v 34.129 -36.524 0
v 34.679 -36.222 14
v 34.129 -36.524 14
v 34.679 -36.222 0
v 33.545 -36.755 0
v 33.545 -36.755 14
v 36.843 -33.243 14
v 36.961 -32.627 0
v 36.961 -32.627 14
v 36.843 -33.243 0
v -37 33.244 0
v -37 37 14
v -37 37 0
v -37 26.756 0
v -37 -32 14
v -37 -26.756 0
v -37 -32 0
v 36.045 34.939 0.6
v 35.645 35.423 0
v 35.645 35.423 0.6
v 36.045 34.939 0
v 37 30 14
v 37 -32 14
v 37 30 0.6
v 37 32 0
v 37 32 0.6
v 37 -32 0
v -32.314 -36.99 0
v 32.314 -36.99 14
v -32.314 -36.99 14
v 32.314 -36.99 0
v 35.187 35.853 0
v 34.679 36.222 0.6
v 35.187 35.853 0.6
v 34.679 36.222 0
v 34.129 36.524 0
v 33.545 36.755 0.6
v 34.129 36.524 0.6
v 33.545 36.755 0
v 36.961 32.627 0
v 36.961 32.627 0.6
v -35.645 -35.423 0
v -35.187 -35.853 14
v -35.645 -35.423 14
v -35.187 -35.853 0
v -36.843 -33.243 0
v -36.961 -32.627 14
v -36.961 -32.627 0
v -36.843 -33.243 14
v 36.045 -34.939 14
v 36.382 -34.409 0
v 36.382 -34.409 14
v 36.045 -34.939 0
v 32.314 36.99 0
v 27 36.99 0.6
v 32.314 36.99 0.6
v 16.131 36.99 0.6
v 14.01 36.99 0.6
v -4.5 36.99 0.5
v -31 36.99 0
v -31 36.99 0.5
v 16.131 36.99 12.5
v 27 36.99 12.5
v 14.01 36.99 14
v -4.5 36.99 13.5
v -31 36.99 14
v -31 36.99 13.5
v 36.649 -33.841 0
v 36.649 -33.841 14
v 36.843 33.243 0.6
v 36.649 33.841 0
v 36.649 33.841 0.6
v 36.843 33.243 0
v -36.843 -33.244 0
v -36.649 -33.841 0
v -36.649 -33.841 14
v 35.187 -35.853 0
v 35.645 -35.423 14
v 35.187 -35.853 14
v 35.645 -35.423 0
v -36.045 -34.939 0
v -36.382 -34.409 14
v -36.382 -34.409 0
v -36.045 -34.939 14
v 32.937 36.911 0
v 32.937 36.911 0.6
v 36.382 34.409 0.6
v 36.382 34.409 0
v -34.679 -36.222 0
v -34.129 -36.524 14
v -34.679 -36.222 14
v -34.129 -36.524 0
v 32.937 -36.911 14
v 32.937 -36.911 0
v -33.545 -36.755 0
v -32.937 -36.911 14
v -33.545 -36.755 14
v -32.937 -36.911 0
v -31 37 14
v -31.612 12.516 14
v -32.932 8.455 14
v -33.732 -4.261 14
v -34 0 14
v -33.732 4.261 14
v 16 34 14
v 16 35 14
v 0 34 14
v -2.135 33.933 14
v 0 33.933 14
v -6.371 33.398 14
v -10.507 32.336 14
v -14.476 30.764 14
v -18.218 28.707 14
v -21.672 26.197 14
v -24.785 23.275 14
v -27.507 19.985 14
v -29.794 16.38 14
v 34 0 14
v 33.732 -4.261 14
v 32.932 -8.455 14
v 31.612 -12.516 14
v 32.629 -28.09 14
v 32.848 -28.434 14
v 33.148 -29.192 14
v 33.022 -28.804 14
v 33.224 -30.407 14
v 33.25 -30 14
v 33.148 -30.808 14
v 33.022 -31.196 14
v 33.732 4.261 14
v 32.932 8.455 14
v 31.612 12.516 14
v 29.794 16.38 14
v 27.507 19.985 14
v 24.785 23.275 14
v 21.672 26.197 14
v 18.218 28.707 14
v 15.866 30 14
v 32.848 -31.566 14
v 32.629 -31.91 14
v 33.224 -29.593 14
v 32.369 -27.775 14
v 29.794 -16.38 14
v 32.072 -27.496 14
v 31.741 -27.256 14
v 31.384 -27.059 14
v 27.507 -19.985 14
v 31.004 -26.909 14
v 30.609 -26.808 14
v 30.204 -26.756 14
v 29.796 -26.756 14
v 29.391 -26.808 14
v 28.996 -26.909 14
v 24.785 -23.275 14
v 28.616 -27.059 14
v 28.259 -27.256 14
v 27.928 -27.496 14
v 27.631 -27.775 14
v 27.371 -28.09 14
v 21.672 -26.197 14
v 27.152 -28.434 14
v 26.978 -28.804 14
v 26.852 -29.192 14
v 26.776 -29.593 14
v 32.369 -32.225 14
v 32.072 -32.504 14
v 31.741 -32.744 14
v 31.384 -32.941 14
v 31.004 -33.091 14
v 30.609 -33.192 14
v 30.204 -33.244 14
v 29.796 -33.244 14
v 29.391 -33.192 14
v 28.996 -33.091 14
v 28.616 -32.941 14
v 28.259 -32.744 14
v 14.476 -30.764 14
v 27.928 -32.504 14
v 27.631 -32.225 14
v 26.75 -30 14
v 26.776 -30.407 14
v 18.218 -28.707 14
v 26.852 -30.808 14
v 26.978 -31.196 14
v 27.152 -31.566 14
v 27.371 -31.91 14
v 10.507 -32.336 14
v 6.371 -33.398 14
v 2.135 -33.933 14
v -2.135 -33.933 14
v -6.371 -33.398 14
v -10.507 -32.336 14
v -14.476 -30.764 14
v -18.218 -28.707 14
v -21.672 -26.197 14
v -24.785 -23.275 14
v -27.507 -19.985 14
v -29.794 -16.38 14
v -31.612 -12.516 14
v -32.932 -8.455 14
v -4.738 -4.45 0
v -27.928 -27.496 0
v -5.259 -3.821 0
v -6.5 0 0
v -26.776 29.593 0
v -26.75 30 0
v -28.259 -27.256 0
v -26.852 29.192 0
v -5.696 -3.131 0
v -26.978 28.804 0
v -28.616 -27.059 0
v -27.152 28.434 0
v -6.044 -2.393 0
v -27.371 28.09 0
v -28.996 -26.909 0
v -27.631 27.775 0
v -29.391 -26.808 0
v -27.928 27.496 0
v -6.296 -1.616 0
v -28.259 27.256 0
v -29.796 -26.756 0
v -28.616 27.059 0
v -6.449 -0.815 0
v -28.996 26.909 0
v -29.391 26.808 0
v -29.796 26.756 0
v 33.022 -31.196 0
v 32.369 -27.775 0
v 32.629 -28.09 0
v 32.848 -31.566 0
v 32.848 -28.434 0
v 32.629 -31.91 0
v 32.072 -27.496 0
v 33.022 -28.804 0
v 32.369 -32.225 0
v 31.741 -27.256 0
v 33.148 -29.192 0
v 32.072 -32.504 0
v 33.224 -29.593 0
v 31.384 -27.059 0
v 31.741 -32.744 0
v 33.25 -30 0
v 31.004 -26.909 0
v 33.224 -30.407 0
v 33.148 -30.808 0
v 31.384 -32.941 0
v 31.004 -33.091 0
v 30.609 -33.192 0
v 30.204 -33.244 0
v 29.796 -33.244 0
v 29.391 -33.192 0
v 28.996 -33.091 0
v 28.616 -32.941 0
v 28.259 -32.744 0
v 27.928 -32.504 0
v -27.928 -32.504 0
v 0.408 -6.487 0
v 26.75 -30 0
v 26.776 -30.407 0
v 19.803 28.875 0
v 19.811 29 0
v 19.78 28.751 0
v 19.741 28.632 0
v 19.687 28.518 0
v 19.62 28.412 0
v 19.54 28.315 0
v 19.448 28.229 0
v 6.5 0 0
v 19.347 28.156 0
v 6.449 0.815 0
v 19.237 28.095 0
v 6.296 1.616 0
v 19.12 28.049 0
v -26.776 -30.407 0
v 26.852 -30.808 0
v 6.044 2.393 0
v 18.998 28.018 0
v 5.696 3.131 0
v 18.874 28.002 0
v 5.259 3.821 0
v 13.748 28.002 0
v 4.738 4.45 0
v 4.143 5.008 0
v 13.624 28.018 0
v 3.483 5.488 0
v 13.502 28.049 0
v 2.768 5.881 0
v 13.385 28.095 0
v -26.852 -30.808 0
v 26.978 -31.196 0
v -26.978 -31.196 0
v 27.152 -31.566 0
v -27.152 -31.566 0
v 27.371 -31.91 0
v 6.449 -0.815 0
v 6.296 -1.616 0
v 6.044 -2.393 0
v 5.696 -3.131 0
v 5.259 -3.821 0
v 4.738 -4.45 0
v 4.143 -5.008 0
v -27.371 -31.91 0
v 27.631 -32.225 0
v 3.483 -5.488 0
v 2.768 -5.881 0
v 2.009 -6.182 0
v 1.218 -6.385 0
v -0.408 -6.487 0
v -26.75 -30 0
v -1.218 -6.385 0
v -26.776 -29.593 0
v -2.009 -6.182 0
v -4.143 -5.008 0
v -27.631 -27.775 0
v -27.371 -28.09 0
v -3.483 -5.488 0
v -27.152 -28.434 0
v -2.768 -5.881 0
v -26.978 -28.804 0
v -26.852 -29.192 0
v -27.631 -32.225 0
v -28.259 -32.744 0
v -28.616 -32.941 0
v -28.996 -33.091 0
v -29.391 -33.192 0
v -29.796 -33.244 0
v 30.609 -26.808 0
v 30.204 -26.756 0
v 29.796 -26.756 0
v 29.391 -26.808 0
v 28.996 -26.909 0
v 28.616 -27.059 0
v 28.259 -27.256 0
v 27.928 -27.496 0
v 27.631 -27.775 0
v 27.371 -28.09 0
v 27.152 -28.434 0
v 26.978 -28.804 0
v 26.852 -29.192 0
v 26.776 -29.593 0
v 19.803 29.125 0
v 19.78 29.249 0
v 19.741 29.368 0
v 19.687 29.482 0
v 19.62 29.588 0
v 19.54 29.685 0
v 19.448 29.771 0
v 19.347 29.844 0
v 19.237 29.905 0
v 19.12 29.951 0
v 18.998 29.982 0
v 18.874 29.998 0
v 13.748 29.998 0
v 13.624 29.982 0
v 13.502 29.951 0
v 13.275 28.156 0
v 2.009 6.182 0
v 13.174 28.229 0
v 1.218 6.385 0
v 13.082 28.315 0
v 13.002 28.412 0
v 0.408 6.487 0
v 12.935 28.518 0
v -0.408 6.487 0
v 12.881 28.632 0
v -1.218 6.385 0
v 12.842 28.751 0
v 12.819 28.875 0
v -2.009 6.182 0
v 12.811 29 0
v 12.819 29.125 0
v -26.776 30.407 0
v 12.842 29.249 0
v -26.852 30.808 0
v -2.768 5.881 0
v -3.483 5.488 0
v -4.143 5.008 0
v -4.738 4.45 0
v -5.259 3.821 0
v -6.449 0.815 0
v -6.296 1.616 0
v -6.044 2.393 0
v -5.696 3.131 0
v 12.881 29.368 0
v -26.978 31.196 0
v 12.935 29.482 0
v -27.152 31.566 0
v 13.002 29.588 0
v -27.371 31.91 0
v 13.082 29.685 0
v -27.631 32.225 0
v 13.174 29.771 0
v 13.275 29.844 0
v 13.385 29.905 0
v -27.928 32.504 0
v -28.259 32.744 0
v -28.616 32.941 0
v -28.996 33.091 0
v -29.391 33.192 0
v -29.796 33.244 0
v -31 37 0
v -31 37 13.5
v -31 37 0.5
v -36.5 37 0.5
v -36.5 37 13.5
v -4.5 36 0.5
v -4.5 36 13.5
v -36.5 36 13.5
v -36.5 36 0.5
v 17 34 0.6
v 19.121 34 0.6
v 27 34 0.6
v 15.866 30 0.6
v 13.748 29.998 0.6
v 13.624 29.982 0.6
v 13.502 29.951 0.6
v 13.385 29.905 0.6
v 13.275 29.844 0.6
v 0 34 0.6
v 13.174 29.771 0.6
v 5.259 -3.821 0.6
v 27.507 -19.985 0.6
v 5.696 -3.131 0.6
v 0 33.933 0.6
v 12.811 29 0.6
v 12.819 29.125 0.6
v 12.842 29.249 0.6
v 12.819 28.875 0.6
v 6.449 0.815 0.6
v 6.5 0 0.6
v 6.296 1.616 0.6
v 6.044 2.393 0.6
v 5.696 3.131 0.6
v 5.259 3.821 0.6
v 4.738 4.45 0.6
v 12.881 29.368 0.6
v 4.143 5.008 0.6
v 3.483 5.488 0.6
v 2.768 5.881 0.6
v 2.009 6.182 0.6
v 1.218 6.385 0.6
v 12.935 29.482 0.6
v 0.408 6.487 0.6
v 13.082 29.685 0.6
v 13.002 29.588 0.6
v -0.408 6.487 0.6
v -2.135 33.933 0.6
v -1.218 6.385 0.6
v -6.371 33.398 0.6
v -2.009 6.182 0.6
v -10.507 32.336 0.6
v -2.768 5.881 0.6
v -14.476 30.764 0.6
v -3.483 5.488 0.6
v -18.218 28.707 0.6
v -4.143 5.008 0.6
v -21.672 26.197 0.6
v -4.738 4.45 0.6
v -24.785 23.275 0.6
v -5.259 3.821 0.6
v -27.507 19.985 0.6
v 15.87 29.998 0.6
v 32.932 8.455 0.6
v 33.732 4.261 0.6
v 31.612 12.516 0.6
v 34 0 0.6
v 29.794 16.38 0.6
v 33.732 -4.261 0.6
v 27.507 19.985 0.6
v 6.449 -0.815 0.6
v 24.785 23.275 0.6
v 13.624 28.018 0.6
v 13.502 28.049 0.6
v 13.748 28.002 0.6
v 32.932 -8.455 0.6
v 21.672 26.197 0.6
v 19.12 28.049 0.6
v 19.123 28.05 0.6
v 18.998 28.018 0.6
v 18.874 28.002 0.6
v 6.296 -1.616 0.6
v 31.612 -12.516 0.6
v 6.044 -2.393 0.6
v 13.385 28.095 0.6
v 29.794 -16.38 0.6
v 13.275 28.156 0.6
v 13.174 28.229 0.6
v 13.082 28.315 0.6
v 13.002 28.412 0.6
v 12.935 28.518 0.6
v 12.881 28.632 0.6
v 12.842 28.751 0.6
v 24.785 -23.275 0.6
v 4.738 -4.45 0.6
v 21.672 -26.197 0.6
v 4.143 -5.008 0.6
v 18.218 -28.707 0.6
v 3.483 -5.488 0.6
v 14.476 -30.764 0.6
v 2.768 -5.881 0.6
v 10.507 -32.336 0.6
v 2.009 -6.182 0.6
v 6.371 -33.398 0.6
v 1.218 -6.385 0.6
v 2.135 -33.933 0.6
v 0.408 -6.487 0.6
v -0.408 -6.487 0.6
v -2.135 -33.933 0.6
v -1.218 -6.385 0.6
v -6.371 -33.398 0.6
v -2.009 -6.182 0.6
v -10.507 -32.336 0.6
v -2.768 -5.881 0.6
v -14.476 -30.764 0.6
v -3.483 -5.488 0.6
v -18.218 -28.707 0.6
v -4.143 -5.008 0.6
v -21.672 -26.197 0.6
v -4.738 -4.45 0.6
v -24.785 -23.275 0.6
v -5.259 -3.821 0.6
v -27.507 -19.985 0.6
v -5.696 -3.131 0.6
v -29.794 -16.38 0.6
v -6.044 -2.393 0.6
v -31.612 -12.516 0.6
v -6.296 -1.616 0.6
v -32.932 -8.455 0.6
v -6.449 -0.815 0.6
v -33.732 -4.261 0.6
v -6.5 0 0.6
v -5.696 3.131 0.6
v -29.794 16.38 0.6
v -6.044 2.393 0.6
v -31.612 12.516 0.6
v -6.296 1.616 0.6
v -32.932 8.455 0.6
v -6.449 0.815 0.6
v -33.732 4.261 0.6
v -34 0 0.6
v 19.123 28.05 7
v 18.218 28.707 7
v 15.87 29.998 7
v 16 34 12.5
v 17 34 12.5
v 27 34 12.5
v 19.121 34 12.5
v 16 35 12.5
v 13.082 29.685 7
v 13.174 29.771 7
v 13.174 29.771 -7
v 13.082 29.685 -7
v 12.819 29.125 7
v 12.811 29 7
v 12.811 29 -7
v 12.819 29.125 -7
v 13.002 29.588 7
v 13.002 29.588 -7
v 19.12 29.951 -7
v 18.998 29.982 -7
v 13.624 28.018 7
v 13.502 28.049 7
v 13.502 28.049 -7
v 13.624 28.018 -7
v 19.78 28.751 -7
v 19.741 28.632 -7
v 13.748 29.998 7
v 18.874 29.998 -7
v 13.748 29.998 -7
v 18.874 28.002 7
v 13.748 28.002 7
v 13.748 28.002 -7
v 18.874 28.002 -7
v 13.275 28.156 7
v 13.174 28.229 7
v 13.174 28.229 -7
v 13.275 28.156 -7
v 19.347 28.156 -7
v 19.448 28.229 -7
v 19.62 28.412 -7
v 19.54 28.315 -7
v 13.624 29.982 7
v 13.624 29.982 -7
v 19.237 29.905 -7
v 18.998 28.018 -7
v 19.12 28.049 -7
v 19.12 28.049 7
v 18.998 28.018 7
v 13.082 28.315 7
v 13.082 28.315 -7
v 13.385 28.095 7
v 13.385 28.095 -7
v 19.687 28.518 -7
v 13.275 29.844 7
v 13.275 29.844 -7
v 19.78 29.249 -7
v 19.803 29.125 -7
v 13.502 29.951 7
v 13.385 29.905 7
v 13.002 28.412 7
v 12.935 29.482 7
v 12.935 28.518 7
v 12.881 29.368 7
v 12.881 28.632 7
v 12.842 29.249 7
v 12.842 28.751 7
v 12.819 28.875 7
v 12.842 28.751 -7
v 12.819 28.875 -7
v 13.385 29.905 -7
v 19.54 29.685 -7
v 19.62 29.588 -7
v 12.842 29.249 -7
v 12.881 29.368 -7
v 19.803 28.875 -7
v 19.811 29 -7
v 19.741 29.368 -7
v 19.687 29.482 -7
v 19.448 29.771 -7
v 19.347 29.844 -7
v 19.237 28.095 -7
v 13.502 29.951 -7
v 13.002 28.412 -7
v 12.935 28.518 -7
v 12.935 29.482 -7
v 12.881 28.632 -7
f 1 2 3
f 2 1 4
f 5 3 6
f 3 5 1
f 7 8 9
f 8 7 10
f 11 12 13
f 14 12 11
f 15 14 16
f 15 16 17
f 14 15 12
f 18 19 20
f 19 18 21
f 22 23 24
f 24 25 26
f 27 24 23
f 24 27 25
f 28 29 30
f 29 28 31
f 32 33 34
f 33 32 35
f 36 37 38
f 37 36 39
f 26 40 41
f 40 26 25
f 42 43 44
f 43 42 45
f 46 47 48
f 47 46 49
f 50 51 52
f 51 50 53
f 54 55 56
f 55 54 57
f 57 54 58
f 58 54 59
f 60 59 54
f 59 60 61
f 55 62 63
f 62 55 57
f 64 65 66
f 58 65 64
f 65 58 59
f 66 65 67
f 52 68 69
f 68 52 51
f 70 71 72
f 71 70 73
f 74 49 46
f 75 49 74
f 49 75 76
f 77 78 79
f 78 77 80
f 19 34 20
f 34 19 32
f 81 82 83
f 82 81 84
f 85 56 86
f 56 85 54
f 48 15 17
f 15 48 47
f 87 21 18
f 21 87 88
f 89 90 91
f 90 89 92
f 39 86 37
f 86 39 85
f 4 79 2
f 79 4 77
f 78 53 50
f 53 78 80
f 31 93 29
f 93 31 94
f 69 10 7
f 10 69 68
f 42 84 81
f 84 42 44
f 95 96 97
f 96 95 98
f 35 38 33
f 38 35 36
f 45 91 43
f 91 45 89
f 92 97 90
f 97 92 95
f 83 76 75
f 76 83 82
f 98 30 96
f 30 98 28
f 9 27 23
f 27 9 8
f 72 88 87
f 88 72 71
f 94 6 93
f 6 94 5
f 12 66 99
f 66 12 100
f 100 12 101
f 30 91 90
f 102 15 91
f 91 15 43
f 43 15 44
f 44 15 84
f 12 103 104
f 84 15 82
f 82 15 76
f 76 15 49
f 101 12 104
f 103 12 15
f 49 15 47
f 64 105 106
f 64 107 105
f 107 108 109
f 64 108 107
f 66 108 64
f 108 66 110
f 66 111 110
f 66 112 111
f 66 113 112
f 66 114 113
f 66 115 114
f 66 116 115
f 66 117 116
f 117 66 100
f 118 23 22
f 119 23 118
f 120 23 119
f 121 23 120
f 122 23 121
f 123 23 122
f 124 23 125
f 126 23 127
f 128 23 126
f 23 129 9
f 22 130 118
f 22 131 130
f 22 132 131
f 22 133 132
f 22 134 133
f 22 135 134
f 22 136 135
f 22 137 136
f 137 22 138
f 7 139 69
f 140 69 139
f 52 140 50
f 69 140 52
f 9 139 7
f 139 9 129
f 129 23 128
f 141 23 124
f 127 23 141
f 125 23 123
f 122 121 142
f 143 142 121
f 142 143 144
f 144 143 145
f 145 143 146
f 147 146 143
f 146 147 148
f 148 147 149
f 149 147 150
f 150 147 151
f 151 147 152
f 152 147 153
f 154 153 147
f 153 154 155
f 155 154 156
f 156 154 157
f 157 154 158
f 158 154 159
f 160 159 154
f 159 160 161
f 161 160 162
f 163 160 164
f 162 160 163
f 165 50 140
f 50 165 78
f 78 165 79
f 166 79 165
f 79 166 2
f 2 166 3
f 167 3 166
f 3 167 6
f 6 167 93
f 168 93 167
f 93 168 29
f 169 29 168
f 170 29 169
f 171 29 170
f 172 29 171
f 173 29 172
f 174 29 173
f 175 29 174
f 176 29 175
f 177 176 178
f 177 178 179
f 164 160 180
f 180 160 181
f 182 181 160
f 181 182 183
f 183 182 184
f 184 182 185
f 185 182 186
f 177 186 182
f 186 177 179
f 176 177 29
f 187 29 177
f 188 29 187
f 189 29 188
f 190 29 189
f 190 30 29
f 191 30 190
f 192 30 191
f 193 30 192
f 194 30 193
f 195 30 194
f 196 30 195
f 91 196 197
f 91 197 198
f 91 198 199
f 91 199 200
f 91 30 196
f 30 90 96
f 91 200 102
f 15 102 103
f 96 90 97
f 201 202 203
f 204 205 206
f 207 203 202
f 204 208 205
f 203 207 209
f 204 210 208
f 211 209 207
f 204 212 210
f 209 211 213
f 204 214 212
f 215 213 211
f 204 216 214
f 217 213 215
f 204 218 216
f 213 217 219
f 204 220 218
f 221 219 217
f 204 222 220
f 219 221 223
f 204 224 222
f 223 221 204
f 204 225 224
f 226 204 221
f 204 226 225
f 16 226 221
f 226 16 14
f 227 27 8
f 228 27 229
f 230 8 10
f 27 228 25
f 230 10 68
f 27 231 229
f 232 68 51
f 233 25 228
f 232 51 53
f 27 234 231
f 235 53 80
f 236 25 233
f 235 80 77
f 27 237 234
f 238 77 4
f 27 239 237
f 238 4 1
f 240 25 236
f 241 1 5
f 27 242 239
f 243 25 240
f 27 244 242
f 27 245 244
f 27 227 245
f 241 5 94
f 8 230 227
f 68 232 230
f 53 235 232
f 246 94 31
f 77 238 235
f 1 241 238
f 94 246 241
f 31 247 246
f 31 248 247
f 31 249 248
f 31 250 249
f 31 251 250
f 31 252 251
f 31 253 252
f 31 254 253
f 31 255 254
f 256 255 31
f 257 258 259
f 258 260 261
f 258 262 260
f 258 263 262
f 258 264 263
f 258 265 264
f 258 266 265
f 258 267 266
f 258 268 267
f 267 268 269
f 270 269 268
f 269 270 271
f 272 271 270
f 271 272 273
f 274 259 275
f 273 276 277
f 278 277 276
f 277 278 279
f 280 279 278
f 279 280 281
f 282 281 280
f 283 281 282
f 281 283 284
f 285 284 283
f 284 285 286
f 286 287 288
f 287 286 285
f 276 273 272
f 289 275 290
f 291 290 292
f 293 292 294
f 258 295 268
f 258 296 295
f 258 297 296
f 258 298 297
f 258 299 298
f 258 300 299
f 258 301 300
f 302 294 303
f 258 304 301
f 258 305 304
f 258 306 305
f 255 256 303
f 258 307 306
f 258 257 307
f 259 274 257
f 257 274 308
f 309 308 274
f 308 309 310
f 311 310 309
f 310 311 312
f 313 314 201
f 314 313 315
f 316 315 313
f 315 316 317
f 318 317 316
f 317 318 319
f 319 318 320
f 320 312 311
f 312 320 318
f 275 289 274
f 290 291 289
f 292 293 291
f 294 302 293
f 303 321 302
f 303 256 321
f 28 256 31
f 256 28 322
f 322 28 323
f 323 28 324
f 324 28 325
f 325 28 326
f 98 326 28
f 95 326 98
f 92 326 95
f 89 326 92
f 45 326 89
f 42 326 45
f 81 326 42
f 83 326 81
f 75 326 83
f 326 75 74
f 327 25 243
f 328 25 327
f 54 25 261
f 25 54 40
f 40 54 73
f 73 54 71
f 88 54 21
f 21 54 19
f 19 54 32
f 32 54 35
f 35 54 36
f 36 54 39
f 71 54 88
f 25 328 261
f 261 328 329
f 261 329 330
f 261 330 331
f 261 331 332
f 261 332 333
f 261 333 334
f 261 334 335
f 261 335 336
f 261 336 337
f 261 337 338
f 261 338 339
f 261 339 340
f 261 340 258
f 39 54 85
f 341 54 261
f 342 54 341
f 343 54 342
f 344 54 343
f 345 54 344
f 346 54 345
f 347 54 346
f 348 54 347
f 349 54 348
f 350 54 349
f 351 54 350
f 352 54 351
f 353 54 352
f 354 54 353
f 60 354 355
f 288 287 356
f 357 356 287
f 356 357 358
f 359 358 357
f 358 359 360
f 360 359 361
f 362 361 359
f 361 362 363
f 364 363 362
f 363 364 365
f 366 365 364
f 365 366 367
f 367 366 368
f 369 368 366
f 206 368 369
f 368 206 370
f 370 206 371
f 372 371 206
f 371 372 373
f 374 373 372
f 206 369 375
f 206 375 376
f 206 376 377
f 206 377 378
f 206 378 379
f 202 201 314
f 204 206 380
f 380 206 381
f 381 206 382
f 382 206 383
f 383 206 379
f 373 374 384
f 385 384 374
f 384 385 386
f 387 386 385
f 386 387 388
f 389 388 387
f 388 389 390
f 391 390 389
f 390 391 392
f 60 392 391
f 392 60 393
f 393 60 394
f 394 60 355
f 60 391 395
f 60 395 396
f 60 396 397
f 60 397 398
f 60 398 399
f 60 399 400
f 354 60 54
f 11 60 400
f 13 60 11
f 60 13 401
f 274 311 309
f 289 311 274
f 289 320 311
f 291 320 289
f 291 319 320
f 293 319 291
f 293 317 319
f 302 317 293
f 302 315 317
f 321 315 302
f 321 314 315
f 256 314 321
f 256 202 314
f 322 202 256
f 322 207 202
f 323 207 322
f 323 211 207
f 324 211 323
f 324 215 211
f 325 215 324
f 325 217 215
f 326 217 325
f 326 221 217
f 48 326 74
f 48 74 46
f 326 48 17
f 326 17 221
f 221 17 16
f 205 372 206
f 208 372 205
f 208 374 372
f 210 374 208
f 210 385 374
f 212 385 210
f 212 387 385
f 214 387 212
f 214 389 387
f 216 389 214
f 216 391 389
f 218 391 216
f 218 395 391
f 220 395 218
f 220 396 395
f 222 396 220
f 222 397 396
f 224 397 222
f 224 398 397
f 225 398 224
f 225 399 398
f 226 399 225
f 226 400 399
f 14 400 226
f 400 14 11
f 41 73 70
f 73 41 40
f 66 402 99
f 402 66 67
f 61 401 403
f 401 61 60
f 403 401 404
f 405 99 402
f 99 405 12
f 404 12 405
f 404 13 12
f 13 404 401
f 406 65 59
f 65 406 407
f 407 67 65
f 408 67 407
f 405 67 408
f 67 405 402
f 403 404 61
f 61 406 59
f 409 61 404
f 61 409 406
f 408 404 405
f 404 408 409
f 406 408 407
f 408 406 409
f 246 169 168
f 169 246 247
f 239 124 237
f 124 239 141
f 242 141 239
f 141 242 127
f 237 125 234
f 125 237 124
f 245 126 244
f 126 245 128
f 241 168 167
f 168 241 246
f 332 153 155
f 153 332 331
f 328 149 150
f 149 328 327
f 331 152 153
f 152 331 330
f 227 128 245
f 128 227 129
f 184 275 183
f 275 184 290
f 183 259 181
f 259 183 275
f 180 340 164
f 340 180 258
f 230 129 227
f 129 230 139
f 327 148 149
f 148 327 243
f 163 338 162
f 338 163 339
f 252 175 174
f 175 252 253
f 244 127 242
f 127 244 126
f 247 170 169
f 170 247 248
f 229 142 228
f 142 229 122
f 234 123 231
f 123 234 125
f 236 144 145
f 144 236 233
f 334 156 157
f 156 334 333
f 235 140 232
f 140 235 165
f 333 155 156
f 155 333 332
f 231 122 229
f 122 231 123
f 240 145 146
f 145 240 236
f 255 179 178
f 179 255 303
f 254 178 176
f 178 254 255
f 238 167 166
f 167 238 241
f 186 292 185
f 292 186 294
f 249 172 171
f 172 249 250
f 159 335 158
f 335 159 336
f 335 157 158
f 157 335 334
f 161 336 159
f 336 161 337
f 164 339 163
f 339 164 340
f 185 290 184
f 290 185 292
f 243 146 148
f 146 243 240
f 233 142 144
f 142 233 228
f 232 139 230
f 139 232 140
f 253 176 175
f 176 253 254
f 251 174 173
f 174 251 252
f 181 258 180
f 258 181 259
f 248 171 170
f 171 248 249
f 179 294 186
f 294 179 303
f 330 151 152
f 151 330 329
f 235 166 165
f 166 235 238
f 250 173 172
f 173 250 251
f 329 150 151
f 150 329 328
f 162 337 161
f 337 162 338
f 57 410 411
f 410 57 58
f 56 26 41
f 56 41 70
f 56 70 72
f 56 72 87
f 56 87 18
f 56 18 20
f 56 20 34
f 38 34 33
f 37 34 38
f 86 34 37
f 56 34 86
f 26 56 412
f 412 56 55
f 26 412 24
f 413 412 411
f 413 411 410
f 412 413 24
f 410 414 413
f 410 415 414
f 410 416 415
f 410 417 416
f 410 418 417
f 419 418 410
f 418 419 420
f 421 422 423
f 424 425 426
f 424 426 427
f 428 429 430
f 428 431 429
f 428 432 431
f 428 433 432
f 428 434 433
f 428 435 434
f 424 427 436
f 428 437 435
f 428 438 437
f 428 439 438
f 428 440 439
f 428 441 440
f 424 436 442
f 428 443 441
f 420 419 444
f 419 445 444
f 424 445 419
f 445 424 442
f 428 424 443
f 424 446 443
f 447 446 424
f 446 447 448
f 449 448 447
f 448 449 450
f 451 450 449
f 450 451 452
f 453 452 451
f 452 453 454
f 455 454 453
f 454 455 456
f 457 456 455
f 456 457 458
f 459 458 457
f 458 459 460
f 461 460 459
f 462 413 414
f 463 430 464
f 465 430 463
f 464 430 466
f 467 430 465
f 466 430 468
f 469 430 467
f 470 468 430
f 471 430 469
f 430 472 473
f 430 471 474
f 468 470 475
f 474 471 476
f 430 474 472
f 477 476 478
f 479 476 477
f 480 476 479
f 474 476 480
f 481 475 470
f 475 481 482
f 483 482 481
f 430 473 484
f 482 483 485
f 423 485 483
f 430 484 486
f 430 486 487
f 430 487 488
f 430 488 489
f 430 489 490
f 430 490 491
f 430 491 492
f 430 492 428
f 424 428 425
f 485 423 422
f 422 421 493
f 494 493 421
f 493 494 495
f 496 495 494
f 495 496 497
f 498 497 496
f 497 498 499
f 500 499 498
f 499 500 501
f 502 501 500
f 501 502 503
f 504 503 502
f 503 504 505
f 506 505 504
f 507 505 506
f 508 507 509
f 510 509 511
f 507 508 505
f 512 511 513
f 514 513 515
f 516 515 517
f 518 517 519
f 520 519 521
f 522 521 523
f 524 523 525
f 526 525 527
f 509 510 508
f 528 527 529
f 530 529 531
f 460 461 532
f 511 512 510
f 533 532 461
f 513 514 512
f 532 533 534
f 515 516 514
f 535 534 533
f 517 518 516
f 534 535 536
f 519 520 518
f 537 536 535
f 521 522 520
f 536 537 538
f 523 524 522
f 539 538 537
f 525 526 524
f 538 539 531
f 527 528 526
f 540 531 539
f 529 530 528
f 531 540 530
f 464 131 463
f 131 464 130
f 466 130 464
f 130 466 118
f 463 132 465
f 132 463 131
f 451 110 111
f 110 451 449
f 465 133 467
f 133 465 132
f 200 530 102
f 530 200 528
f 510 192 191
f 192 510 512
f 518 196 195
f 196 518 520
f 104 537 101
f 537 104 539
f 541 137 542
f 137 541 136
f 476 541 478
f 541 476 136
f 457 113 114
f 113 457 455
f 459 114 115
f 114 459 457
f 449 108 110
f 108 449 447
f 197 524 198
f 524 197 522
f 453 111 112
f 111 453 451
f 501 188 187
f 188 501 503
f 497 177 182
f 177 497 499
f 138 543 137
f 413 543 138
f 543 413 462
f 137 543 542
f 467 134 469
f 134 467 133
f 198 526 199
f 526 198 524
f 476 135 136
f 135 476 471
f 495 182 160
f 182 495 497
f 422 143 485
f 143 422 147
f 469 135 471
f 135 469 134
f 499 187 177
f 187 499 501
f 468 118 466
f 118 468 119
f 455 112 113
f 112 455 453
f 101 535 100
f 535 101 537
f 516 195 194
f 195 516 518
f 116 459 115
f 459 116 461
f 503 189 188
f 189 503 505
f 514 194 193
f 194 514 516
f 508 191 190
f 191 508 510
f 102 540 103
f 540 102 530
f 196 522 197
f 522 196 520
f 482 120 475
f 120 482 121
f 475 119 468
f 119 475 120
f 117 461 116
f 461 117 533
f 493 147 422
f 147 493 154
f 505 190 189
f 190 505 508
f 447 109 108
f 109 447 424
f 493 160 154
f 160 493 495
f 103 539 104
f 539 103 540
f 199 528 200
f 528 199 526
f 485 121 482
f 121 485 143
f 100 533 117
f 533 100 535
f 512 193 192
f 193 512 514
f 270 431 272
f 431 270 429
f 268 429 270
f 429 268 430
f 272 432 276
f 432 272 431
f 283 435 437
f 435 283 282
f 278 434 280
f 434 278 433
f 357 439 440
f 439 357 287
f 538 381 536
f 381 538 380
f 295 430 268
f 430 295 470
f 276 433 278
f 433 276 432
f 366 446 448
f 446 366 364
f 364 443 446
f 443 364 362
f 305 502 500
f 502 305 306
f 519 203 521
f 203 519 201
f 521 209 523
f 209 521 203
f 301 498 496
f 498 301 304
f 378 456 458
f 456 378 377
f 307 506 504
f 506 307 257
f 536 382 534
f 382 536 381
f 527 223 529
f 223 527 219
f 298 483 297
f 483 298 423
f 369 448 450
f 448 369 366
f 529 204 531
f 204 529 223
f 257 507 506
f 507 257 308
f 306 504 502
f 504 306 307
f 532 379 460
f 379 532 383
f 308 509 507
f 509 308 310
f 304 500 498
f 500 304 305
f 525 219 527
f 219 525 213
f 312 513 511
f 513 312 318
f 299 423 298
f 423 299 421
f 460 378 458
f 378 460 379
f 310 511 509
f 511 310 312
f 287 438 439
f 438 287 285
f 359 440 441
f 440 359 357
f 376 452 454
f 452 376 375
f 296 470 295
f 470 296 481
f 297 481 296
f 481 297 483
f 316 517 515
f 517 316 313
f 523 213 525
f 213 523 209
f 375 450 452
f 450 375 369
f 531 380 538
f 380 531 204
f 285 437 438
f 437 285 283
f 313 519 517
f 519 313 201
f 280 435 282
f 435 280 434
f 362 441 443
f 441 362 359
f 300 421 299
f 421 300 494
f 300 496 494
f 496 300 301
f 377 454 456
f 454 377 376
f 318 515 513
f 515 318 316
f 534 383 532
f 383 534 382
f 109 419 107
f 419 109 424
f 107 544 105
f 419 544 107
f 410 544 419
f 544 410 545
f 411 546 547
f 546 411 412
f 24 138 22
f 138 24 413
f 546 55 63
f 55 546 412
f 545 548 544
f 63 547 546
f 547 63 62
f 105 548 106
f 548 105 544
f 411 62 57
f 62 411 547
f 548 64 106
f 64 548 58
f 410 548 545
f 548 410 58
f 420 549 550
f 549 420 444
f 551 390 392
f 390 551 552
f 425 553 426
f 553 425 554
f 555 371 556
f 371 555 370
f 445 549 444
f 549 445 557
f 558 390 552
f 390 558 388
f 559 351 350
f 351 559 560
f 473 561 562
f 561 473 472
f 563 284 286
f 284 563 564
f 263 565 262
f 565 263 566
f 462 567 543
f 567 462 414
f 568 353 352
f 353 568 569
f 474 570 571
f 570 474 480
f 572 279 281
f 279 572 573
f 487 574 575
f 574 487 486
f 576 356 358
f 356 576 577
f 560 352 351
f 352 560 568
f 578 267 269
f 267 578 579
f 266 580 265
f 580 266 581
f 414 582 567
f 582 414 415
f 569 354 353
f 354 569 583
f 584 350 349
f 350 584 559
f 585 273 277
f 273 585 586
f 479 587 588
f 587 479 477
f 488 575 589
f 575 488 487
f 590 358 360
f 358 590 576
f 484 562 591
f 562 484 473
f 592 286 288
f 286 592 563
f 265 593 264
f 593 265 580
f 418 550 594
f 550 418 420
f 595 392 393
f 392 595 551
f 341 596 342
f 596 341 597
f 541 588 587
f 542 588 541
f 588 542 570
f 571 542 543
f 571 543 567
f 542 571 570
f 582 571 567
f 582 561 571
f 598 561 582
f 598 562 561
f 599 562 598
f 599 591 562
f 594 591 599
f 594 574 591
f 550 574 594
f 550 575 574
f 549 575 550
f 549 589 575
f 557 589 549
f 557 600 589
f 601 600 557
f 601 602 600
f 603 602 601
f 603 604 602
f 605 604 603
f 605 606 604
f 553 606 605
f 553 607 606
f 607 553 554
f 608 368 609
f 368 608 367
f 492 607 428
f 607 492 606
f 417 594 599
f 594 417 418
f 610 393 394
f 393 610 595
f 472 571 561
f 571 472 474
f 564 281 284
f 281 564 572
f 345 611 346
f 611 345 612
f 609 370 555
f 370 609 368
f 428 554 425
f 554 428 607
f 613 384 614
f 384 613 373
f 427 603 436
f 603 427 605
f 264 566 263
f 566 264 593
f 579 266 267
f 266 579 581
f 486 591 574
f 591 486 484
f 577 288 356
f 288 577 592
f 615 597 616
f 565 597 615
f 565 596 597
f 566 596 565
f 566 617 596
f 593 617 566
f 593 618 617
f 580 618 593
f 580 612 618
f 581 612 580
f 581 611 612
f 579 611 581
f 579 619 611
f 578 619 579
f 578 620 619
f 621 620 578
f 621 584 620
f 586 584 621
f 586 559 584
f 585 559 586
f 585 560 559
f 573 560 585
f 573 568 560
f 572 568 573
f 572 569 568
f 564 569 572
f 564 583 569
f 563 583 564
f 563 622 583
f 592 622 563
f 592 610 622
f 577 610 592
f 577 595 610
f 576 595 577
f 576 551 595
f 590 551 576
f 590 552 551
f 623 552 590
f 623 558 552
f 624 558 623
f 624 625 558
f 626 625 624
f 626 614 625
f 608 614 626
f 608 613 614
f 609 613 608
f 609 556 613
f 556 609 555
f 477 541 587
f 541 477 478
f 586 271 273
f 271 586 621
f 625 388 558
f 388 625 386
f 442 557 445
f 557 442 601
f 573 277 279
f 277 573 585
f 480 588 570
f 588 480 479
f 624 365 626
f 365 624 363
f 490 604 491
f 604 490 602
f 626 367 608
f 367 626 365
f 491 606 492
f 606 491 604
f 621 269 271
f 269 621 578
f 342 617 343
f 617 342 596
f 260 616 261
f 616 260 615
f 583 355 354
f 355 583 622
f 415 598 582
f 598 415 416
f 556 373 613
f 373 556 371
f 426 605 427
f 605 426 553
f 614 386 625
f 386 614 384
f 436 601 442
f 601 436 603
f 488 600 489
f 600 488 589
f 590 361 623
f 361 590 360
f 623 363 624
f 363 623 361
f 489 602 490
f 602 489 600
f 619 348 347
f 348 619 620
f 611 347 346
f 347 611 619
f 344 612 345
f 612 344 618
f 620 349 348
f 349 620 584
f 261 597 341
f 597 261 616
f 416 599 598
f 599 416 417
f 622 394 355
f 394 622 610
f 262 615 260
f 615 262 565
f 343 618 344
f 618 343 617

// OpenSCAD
$fn = 50;


union() {
	difference() {
		union() {
			hull() {
				translate(v = [-32.0000000000, 32.0000000000, 0]) {
					cylinder(h = 14, r = 5);
				}
				translate(v = [32.0000000000, 32.0000000000, 0]) {
					cylinder(h = 14, r = 5);
				}
				translate(v = [-32.0000000000, -32.0000000000, 0]) {
					cylinder(h = 14, r = 5);
				}
				translate(v = [32.0000000000, -32.0000000000, 0]) {
					cylinder(h = 14, r = 5);
				}
			}
			translate(v = [-37.0000000000, 31.0000000000, 0]) {
				cube(size = [6, 6, 14]);
			}
		}
		union() {
			translate(v = [-37.5000000000, -30.0000000000, -250.0000000000]) {
				rotate(a = [0, 0, 0]) {
					difference() {
						union() {
							hull() {
								translate(v = [7.5000000000, 0, 0]) {
									cylinder(h = 250, r = 3.2500000000, r1 = 3.2500000000, r2 = 3.2500000000);
								}
								translate(v = [-7.5000000000, 0, 0]) {
									cylinder(h = 250, r = 3.2500000000, r1 = 3.2500000000, r2 = 3.2500000000);
								}
							}
						}
						union();
					}
				}
			}
			translate(v = [-37.5000000000, 30.0000000000, -250.0000000000]) {
				rotate(a = [0, 0, 0]) {
					difference() {
						union() {
							hull() {
								translate(v = [7.5000000000, 0, 0]) {
									cylinder(h = 250, r = 3.2500000000, r1 = 3.2500000000, r2 = 3.2500000000);
								}
								translate(v = [-7.5000000000, 0, 0]) {
									cylinder(h = 250, r = 3.2500000000, r1 = 3.2500000000, r2 = 3.2500000000);
								}
							}
						}
						union();
					}
				}
			}
			translate(v = [-36.5000000000, 36.0000000000, 0.5000000000]) {
				cube(size = [32, 1, 13.0000000000]);
			}
			translate(v = [30.0000000000, -30.0000000000, 0]) {
				cylinder(h = 100, r = 3.2500000000);
			}
			translate(v = [0, 0, 0.6000000000]) {
				cylinder(h = 16.4000000000, r = 34.0000000000);
			}
			translate(v = [0, 0, -7.0000000000]) {
				cylinder(h = 14, r = 6.5000000000);
			}
			translate(v = [0.0000000000, 30.0000000000, 0.6000000000]) {
				cube(size = [37.0000000000, 4, 16.4000000000]);
			}
			translate(v = [27.0000000000, 30.0000000000, 0.6000000000]) {
				cube(size = [10, 7, 16.4000000000]);
			}
			translate(v = [16.0000000000, 30.0000000000, 12.5000000000]) {
				cube(size = [21, 7, 1.5000000000]);
			}
			translate(v = [13.2500000000, 37.7500000000, 0.6000000000]) {
				rotate(a = [0, 0, -45]) {
					cube(size = [7.5000000000, 1.5000000000, 16.4000000000]);
				}
			}
			translate(v = [7.0610000000, 28.0000000000, 0.6000000000]) {
				cube(size = [7.5000000000, 2, 13.4000000000]);
			}
		}
	}
	union() {
		translate(v = [16.3110000000, 29.0000000000, -7.0000000000]) {
			rotate(a = [0, 0, 0]) {
				difference() {
					union() {
						#hull() {
							#translate(v = [2.5000000000, 0, 0]) {
								cylinder(h = 14, r = 1.0000000000, r1 = 1.0000000000, r2 = 1.0000000000);
							}
							#translate(v = [-2.5000000000, 0, 0]) {
								cylinder(h = 14, r = 1.0000000000, r1 = 1.0000000000, r2 = 1.0000000000);
							}
						}
					}
					union();
				}
			}
		}
	}
}
